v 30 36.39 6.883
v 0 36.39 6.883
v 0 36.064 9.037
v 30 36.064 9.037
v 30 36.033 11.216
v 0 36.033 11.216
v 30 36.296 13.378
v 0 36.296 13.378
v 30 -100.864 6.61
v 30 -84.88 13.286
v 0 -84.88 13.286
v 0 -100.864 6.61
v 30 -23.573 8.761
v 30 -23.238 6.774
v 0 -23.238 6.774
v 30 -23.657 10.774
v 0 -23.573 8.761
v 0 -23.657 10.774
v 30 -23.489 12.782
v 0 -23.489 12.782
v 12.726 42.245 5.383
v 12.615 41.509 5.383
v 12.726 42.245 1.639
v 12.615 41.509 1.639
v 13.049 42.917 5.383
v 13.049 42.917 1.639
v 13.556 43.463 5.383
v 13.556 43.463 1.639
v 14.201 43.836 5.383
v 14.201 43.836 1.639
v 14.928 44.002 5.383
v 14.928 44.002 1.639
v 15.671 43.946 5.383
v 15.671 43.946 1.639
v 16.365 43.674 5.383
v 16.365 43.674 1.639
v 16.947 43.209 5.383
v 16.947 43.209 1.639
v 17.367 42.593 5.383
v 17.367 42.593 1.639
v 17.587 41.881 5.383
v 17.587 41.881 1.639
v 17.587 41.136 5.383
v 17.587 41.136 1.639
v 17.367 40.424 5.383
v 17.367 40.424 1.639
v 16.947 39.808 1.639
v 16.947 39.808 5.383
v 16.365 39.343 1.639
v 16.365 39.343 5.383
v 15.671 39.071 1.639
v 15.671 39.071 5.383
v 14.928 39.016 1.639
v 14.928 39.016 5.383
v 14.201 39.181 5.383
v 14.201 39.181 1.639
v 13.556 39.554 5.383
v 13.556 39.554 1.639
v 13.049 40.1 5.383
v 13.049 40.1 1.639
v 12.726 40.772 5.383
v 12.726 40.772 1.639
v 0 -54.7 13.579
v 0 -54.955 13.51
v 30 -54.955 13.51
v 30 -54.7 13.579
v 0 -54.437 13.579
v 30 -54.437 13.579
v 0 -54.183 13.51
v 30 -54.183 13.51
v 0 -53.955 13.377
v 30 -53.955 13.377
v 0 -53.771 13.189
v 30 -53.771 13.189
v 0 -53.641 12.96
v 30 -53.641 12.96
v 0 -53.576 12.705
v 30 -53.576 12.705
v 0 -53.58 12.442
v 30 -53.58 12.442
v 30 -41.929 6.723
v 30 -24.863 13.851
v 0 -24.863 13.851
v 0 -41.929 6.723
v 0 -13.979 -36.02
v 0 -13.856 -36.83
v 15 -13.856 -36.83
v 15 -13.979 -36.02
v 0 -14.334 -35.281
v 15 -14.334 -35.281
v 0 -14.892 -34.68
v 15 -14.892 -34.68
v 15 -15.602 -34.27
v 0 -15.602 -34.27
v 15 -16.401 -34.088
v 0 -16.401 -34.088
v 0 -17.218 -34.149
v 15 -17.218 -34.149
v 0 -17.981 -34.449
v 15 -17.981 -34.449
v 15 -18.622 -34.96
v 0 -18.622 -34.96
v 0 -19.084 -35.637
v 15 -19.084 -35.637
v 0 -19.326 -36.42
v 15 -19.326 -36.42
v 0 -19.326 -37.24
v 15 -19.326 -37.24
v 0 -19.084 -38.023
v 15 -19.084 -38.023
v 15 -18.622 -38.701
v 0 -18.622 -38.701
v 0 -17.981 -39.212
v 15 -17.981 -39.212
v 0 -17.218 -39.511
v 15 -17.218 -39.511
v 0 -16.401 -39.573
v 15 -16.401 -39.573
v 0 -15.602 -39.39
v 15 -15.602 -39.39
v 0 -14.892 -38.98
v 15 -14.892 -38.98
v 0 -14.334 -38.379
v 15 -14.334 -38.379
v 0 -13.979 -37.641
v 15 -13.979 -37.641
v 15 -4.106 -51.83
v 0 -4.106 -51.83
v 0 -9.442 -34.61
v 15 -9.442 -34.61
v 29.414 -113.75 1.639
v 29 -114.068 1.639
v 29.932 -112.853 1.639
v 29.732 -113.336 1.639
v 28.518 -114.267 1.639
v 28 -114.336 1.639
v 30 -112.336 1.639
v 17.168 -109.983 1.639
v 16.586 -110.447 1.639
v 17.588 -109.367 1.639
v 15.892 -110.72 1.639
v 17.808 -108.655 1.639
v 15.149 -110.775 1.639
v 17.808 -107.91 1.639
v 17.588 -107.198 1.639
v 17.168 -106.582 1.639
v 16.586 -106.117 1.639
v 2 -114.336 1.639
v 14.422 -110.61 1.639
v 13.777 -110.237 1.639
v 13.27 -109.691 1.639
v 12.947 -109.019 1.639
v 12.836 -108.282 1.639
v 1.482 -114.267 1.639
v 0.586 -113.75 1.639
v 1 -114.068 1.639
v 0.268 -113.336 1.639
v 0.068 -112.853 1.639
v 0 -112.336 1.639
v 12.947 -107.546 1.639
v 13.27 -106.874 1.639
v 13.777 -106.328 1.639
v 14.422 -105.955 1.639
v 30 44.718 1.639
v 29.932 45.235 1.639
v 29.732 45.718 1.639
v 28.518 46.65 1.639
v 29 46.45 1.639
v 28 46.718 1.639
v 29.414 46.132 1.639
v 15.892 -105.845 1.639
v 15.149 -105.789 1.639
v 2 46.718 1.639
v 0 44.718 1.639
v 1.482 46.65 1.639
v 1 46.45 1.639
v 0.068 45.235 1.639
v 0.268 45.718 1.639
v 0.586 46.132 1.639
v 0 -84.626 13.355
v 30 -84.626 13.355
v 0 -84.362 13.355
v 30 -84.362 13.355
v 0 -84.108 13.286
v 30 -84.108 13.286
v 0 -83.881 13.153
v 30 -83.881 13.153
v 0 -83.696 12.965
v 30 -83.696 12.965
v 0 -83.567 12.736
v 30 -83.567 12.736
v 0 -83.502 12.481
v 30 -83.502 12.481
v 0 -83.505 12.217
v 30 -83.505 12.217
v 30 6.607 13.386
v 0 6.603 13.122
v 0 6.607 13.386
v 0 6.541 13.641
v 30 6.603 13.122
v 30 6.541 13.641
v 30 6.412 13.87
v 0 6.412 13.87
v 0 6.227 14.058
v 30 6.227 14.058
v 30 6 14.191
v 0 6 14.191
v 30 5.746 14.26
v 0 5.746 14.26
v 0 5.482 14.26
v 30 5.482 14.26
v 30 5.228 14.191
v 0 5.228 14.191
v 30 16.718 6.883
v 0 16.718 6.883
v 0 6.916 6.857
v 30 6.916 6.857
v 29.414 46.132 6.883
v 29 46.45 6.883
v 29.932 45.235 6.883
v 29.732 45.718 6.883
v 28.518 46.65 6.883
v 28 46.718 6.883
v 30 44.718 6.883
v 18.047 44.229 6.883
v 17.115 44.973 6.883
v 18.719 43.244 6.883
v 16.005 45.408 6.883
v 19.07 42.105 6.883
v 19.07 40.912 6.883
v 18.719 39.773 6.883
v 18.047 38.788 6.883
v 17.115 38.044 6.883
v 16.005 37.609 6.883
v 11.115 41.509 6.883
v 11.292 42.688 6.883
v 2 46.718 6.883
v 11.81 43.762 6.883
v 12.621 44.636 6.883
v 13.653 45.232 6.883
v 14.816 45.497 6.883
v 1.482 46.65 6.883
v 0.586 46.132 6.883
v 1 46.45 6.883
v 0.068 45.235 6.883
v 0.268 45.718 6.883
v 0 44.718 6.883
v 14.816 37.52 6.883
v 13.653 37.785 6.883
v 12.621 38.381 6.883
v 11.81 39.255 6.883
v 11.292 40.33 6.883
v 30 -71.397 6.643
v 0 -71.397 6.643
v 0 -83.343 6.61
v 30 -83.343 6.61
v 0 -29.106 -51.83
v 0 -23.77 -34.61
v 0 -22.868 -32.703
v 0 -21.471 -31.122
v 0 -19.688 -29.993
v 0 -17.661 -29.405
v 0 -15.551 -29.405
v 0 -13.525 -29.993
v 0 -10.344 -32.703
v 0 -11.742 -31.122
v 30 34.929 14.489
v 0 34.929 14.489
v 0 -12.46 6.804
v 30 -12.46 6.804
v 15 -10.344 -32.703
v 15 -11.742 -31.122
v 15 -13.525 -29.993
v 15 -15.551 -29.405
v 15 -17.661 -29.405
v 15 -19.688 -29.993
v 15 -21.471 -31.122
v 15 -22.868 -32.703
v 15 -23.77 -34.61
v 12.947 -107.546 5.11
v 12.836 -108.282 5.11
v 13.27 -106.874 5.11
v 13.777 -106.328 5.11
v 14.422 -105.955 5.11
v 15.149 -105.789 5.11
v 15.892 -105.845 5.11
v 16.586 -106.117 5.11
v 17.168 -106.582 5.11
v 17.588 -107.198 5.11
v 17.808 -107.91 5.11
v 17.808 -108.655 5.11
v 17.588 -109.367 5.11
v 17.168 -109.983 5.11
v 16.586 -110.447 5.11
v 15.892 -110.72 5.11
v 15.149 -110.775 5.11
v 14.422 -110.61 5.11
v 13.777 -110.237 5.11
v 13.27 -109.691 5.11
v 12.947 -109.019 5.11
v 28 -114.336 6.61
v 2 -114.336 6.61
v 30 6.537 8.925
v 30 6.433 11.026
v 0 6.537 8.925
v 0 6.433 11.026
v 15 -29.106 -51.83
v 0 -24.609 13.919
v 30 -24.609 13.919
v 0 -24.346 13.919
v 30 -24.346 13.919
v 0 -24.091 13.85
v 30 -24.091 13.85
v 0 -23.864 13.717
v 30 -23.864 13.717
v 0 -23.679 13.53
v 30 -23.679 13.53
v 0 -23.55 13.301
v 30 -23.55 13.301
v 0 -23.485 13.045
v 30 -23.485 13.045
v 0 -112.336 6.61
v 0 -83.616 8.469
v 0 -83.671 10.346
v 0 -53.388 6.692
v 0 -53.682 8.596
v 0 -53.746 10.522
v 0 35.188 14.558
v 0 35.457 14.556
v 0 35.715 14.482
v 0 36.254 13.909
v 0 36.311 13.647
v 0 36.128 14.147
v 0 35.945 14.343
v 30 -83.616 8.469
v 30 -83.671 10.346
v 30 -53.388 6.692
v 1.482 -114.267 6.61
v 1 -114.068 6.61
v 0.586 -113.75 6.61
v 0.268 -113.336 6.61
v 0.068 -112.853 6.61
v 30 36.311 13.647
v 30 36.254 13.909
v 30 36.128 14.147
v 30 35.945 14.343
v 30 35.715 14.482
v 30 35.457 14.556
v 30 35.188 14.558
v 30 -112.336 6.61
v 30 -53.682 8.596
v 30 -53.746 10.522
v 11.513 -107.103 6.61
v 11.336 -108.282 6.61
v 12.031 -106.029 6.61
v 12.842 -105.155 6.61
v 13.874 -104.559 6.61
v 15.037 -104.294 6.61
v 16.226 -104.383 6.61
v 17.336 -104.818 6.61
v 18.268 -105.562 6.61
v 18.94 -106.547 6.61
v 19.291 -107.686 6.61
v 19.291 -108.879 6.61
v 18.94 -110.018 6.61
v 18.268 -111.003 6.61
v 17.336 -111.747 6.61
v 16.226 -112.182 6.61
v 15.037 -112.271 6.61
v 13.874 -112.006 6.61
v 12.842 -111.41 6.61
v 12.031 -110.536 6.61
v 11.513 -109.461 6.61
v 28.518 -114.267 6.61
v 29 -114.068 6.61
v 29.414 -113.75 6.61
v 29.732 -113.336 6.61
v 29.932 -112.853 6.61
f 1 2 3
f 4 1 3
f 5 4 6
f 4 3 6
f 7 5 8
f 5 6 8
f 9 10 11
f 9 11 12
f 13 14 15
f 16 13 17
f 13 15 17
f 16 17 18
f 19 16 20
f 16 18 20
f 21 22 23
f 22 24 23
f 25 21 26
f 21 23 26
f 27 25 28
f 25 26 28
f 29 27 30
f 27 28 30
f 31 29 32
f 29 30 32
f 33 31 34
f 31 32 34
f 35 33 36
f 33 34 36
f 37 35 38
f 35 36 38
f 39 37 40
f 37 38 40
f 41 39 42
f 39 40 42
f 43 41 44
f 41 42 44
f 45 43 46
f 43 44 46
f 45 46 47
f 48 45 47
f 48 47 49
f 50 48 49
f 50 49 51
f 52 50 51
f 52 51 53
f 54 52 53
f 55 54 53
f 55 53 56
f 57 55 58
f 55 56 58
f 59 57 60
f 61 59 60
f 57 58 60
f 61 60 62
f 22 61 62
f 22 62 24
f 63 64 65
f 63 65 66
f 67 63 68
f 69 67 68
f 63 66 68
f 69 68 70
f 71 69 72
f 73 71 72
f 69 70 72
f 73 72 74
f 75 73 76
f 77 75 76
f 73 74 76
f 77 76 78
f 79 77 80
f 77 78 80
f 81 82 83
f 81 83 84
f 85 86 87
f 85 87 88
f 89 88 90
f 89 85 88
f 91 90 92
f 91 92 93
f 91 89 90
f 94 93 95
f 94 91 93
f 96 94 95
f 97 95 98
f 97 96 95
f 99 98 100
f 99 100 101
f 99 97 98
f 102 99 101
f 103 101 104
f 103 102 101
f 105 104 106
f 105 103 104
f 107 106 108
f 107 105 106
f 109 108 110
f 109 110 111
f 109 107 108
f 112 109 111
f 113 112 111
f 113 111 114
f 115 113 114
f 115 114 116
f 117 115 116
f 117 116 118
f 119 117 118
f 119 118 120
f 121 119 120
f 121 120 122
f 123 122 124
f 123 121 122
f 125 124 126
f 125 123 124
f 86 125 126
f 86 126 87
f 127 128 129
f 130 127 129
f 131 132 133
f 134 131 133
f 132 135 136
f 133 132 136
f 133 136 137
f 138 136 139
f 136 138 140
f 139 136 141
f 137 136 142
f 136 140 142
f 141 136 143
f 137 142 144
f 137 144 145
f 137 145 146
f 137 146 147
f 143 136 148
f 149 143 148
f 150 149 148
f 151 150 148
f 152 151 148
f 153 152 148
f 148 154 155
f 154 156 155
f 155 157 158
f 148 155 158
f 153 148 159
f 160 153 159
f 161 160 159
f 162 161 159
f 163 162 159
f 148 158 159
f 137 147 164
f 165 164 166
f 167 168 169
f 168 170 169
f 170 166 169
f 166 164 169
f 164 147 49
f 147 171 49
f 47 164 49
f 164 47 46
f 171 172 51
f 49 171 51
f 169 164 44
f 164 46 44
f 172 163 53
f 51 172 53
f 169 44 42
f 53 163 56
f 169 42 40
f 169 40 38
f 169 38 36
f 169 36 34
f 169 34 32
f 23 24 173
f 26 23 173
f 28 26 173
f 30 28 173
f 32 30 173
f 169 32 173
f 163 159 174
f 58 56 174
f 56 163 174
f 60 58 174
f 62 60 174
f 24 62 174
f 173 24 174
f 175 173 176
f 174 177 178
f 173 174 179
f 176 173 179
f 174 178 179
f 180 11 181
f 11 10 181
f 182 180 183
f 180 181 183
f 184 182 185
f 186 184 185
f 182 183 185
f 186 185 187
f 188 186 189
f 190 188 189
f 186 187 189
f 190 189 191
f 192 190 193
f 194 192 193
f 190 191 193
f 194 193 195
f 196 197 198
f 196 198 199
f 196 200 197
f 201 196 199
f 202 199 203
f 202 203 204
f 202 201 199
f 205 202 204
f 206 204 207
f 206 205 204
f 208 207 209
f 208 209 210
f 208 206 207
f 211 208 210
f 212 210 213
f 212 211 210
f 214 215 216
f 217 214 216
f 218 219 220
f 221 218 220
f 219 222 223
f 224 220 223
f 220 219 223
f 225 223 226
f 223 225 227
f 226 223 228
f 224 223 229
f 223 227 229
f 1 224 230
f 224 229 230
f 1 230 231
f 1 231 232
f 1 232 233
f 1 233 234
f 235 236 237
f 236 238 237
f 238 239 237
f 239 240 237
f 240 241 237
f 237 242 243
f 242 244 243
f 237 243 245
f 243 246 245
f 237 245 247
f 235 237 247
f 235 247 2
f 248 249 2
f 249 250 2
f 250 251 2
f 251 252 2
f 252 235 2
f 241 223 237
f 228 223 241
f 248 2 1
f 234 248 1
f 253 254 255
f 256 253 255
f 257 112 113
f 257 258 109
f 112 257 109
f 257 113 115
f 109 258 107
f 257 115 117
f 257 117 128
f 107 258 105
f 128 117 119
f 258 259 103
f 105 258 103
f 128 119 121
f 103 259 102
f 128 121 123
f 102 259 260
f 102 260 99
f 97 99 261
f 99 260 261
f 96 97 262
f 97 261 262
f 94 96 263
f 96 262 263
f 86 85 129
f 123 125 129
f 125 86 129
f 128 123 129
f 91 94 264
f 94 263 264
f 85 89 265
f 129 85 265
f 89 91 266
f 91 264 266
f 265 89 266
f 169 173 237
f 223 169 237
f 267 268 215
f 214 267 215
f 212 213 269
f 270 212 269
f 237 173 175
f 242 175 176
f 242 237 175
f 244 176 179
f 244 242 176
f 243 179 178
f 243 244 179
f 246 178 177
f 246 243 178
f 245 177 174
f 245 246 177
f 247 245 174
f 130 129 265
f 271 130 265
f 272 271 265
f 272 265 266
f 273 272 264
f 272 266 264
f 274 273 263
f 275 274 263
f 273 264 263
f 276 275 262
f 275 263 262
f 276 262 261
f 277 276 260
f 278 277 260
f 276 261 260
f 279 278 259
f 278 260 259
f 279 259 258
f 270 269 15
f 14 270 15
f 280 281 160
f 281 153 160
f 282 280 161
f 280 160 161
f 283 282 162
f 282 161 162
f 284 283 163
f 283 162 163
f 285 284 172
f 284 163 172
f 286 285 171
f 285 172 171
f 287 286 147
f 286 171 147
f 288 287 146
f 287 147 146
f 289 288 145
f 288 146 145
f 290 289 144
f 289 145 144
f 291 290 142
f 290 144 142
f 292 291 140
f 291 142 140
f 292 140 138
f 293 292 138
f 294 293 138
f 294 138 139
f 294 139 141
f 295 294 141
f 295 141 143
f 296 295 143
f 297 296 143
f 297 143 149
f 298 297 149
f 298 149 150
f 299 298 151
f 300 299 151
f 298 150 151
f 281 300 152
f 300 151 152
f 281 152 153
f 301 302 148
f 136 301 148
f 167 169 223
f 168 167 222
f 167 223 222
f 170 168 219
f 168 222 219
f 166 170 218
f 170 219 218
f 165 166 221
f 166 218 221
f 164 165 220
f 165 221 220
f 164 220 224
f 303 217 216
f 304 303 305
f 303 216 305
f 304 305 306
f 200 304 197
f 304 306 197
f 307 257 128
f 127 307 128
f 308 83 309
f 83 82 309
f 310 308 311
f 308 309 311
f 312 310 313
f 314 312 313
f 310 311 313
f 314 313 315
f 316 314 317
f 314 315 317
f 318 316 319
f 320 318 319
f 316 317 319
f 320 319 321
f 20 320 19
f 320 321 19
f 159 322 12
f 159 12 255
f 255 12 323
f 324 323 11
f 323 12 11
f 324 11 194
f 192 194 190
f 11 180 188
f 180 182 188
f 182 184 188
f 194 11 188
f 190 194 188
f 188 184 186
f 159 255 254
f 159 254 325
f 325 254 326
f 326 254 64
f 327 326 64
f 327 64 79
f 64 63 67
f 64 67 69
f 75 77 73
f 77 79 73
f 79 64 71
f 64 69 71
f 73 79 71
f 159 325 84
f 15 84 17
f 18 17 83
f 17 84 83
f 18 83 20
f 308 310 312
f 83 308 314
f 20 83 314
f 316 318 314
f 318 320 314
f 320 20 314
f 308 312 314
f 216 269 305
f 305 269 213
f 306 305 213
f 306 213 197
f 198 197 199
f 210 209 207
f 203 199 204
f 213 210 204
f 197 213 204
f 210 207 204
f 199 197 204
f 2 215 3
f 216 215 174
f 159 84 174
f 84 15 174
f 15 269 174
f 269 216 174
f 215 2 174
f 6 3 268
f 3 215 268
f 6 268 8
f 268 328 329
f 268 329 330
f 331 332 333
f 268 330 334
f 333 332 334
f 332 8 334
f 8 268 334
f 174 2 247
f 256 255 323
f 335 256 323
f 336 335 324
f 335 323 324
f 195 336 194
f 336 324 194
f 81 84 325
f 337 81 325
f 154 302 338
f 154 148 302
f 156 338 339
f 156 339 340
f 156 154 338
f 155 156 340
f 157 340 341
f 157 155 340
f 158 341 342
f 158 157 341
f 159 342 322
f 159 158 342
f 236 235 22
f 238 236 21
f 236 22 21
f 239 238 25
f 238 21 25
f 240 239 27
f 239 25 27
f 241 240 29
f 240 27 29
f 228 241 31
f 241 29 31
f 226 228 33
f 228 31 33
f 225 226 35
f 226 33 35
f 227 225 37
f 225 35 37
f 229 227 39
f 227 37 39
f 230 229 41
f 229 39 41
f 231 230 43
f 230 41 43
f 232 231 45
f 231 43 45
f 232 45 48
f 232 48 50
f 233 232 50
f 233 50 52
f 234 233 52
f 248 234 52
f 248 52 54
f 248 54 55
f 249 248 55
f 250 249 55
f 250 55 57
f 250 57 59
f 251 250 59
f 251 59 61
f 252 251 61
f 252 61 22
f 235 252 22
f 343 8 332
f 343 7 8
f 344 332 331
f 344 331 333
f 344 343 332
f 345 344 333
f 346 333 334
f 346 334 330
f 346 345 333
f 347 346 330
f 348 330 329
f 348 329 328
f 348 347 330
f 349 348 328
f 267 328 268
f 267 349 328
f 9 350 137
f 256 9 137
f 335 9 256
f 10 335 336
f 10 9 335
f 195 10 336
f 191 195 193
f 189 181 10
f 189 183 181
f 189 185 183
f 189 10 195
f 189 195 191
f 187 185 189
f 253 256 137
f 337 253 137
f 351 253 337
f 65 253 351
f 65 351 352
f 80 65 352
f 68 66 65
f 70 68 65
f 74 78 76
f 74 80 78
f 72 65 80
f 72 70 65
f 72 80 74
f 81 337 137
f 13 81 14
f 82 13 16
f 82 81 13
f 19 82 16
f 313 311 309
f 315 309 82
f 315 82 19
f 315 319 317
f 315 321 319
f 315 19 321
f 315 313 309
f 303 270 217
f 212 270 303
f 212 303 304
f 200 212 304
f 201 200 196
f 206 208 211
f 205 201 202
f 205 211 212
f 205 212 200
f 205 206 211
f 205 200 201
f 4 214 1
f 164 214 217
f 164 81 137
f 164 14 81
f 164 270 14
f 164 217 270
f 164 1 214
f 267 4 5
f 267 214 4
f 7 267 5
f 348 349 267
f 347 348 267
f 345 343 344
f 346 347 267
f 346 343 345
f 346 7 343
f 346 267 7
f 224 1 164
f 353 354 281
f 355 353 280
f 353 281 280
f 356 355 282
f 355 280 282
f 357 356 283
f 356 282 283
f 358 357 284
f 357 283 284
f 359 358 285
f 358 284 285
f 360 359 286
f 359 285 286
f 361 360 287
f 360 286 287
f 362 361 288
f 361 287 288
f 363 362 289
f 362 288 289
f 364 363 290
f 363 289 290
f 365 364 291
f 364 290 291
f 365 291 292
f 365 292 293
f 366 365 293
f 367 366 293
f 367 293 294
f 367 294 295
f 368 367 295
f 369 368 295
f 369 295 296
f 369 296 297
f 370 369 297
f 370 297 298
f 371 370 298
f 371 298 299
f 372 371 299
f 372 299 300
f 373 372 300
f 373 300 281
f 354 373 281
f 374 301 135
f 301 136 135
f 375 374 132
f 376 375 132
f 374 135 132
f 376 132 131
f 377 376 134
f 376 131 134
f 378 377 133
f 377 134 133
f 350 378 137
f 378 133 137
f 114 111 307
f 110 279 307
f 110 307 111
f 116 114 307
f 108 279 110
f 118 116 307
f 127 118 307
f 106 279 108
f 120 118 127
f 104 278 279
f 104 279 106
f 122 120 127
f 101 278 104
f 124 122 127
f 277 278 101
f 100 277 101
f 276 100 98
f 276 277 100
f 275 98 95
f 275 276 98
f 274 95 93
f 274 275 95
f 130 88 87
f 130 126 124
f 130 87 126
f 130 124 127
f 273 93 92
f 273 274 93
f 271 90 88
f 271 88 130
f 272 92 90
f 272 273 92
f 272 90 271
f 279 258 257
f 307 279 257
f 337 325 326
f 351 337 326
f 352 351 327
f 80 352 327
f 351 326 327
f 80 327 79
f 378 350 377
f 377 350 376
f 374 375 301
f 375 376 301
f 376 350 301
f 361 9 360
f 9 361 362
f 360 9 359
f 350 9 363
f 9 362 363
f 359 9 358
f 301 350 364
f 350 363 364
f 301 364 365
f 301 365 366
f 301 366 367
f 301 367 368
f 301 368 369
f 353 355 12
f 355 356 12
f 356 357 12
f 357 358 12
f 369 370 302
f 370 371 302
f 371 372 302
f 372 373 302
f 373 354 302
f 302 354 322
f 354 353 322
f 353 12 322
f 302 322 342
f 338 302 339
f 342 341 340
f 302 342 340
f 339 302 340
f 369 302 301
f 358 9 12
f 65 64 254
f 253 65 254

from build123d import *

# Parameters (mm, degrees)
F1_DEPTH       = 30
F2_R           = 2
F3_R           = 1
F5_D           = 5
F5_CSINK_D     = 8
F5_CSINK_ANGLE = 90
F7_D           = 5
F7_CSINK_D     = 8
F7_CSINK_ANGLE = 90
F8_R           = 2.75
F9_DEPTH       = 15


with BuildPart() as f1:
    # F0 (on Right) → F1 (new body)
    with BuildSketch(Plane.YZ):
        with BuildLine():
            Line((-114.335611, 1.639002), (-103.282312, 1.639002))
            Line((-103.282312, 1.639002), (-103.19238, 1.639002))
            Line((-103.19238, 1.639002), (36.717688, 1.639002))
            Line((36.717688, 1.639002), (46.717688, 1.639002))
            Line((46.717688, 1.639002), (46.717688, 5.639002))
            Line((46.717688, 5.639002), (46.717688, 6.883289))
            Line((46.717688, 6.883289), (36.389513, 6.883289))
            ThreePointArc((36.389513, 6.883289), (36.026758, 11.097664), (36.776017, 15.260735))
            Line((36.776017, 15.260735), (16.717688, 6.883289))
            Line((16.717688, 6.883289), (6.915737, 6.856559))
            ThreePointArc((6.915737, 6.856559), (6.430977, 10.892172), (6.974065, 14.92035))
            Line((6.974065, 14.92035), (-12.459779, 6.803723))
            Line((-12.459779, 6.803723), (-23.238242, 6.77433))
            ThreePointArc((-23.238242, 6.77433), (-23.658847, 10.684605), (-23.117268, 14.579968))
            Line((-23.117268, 14.579968), (-41.928537, 6.723361))
            Line((-41.928537, 6.723361), (-53.387725, 6.692112))
            ThreePointArc((-53.387725, 6.692112), (-53.747579, 10.476515), (-53.208595, 14.239585))
            Line((-53.208595, 14.239585), (-71.397287, 6.643))
            Line((-71.397287, 6.643), (-83.343368, 6.610423))
            ThreePointArc((-83.343368, 6.610423), (-83.671143, 10.325154), (-83.134051, 14.015437))
            Line((-83.134051, 14.015437), (-100.864061, 6.610423))
            Line((-100.864061, 6.610423), (-114.335611, 6.610423))
            Line((-114.335611, 6.610423), (-114.335611, 1.639002))
        make_face()
    extrude(amount=F1_DEPTH)

    # F2
    f2_edges = [f1.edges().sort_by_distance(p)[0] for p in [
        (0, -114.335611, 4.124713),
        (30, -114.335611, 4.124713),
        (0, 46.717688, 4.261146),
        (30, 46.717688, 4.261146),
    ]]
    fillet(f2_edges, radius=F2_R)

    # F3
    f3_edges = [f1.edges().sort_by_distance(p)[0] for p in [
        (15, 36.776017, 15.260735),
        (15, 6.974065, 14.92035),
        (15, -23.117268, 14.579968),
        (15, -53.208595, 14.239585),
        (15, -83.134051, 14.015437),
    ]]
    fillet(f3_edges, radius=F3_R)

    # F5 (through all)
    with Locations(Plane.XY.offset(6.610423)):
        with Locations((15.335711, -108.282417)):
            CounterSinkHole(F5_D / 2, F5_CSINK_D / 2, counter_sink_angle=F5_CSINK_ANGLE)

    # F7 (through all)
    with Locations(Plane.XY.offset(6.883289)):
        with Locations((15.114769, 41.508552)):
            CounterSinkHole(F7_D / 2, F7_CSINK_D / 2, counter_sink_angle=F7_CSINK_ANGLE)


with BuildPart() as f9:
    # F8 (on Right) → F9 (new body)
    with BuildSketch(Plane.YZ):
        with BuildLine():
            Line((-4.106375, -51.830195), (-9.442447, -34.610255))
            ThreePointArc((-9.442447, -34.610255), (-16.606375, -29.330195), (-23.770303, -34.610255))
            Line((-23.770303, -34.610255), (-29.106375, -51.830195))
            Line((-29.106375, -51.830195), (-4.106375, -51.830195))
        make_face()
        with Locations((-16.606375, -36.830195)):
            Circle(F8_R, mode=Mode.SUBTRACT)
    extrude(amount=F9_DEPTH)


solid = Compound([f1.part, f9.part])
